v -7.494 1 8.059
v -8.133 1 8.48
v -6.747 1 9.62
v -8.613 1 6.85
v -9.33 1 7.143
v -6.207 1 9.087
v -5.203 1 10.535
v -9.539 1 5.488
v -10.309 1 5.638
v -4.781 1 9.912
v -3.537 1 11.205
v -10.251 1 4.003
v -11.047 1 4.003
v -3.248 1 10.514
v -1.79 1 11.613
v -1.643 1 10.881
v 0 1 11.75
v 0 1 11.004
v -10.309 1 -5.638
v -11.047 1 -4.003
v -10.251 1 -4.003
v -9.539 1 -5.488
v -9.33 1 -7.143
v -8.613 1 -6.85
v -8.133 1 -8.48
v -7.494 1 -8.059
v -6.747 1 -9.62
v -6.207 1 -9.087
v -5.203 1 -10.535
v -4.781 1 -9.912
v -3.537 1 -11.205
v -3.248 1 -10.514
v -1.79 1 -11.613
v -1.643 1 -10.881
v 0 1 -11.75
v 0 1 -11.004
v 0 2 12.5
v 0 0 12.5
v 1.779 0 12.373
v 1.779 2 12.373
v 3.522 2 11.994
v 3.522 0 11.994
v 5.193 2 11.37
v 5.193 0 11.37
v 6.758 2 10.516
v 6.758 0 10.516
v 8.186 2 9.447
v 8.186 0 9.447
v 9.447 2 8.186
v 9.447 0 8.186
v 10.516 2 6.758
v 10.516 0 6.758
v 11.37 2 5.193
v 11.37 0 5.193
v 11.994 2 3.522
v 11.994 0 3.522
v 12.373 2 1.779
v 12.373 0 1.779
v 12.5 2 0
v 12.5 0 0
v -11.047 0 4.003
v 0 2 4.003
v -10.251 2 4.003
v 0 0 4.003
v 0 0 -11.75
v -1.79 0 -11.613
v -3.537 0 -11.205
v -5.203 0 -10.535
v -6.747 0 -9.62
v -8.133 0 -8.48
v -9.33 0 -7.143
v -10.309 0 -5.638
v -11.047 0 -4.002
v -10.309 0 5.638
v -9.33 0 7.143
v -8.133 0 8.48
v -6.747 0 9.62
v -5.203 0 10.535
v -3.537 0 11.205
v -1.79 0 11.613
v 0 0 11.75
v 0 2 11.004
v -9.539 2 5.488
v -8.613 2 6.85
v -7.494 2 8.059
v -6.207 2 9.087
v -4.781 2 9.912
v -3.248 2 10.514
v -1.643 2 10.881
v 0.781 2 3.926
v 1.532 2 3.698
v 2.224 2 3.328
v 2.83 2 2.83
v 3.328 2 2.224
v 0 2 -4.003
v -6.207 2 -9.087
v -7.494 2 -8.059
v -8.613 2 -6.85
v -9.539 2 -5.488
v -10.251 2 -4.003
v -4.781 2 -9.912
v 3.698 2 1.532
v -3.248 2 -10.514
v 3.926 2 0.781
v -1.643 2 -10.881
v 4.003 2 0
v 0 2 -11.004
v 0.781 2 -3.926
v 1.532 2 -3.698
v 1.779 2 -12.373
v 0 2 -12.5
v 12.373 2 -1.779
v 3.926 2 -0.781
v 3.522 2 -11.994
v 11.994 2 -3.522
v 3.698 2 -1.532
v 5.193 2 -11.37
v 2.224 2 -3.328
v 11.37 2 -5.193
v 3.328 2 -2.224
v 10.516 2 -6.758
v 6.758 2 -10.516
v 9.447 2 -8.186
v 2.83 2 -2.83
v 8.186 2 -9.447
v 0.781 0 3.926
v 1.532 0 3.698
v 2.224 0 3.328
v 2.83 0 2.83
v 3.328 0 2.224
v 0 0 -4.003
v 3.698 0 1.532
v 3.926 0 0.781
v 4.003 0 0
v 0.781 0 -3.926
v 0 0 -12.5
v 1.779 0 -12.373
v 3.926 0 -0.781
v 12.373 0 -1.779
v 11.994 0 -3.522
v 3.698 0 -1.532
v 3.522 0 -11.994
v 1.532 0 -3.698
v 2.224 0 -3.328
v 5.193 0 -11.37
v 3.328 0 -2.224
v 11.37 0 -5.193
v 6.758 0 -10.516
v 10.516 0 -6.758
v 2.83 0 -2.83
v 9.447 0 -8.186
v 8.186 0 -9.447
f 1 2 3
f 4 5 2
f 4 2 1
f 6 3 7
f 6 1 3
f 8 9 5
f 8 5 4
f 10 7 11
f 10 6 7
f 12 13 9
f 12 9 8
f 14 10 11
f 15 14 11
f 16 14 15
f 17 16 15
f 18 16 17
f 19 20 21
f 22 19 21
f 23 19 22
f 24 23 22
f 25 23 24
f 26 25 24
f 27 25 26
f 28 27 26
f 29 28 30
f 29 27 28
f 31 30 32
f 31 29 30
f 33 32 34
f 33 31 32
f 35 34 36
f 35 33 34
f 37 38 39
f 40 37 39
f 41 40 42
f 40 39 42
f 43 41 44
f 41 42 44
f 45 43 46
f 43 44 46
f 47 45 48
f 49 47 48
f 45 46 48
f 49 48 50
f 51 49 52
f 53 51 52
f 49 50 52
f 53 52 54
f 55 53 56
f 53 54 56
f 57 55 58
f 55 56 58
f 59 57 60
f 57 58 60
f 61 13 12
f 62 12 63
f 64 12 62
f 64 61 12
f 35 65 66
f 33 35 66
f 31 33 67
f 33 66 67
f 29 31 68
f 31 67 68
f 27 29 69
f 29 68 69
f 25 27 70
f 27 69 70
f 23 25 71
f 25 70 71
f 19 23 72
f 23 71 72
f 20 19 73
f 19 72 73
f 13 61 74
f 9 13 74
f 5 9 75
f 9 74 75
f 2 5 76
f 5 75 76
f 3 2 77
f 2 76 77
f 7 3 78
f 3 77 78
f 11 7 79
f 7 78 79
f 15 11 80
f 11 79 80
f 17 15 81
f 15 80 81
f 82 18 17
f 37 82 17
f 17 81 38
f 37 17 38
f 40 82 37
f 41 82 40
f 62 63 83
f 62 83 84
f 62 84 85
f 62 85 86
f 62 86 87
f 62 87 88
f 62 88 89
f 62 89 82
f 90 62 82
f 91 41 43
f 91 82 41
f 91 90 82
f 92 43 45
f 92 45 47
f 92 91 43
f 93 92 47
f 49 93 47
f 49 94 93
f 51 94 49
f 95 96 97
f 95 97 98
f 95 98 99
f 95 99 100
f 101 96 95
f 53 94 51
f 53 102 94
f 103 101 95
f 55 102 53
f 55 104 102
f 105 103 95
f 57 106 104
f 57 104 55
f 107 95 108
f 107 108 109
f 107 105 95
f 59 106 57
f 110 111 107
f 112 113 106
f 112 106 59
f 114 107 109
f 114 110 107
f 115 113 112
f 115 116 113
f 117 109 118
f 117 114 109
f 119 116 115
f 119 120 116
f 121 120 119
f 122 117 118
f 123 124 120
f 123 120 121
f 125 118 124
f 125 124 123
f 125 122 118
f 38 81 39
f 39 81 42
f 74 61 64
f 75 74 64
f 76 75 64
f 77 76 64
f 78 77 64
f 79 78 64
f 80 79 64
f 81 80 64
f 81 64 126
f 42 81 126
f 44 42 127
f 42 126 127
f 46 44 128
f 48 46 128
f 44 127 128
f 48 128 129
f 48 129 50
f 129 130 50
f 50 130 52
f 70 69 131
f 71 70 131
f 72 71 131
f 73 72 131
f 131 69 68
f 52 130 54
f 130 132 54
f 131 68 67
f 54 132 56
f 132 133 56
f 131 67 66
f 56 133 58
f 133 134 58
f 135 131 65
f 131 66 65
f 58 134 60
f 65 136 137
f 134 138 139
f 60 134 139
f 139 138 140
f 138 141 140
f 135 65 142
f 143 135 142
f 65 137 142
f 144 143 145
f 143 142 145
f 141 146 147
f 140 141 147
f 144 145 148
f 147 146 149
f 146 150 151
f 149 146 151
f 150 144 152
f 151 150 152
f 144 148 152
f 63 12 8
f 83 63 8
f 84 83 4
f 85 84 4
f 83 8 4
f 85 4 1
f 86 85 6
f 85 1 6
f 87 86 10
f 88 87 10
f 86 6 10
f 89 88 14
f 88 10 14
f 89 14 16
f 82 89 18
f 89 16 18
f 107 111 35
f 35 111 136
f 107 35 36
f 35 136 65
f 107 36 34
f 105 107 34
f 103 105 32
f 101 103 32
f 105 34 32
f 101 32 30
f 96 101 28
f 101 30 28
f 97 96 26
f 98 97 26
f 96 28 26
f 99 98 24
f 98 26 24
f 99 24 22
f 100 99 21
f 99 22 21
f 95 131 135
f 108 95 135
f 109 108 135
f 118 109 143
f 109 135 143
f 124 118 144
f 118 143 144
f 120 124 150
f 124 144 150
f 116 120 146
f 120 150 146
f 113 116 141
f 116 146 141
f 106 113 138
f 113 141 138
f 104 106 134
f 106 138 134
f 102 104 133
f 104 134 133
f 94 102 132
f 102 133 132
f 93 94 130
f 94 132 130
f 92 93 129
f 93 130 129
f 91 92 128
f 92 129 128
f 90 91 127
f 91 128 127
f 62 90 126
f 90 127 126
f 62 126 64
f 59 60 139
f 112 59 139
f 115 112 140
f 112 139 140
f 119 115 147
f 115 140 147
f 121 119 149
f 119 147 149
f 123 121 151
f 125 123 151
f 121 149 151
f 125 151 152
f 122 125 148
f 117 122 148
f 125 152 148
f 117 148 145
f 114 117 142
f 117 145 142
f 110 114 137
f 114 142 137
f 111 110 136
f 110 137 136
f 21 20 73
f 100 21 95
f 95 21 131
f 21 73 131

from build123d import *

# Parameters (mm, degrees)
BOSS_EXTRUDE1_DEPTH = 2
BOSS_EXTRUDE2_START = 1
SKETCH1_5_R         = 11.75
BOSS_EXTRUDE2_DEPTH = 1
CUT_EXTRUDE4_DEPTH  = 11
BOSS_EXTRUDE3_DEPTH = 1
BOSS_EXTRUDE4_DEPTH = 1
CUT_EXTRUDE5_START  = 2
CUT_EXTRUDE5_DEPTH  = 1
BOSS_EXTRUDE5_DEPTH = 2


with BuildPart() as part:
    # Sketch1 → Boss-Extrude1 (new body)
    with BuildSketch(Plane(origin=(0, 0, 0), x_dir=(1, 0, 0), z_dir=(0, 1, 0))):
        with BuildLine():
            Line((0, 12.5), (0, 11.75))
            ThreePointArc((0, 11.75), (8.308504679, 8.308504679), (11.75, 0))
            ThreePointArc((11.75, 0), (8.308504679, -8.308504679), (0, -11.75))
            Line((0, -11.75), (0, -12.5))
            ThreePointArc((0, -12.5), (8.838834765, -8.838834765), (12.5, 0))
            ThreePointArc((12.5, 0), (8.838834765, 8.838834765), (0, 12.5))
        make_face()
        with BuildLine():
            Line((0, 11.75), (0, 11.0045))
            ThreePointArc((0, 11.0045), (7.781356574, 7.781356574), (11.0045, 0))
            ThreePointArc((11.0045, 0), (7.781356574, -7.781356574), (0, -11.0045))
            Line((0, -11.0045), (0, -11.75))
            ThreePointArc((0, -11.75), (8.308504679, -8.308504679), (11.75, 0))
            ThreePointArc((11.75, 0), (8.308504679, 8.308504679), (0, 11.75))
        make_face()
    extrude(amount=BOSS_EXTRUDE1_DEPTH)

    # Sketch1<5> → Boss-Extrude2 (add)
    with BuildSketch(Plane(origin=(0, 0, 0), x_dir=(1, 0, 0), z_dir=(0, 1, 0)).offset(BOSS_EXTRUDE2_START)):
        Circle(SKETCH1_5_R)
    extrude(amount=BOSS_EXTRUDE2_DEPTH)

    # Sketch1<8> → Cut-Extrude4 (cut)
    with BuildSketch(Plane(origin=(0, 0, 0), x_dir=(1, 0, 0), z_dir=(0, 1, 0))):
        with BuildLine():
            ThreePointArc((4.0025, 0), (2.830194892, 2.830194892), (0, 4.0025))
            Line((0, 4.0025), (0, -4.0025))
            ThreePointArc((0, -4.0025), (2.830194892, -2.830194892), (4.0025, 0))
        make_face()
        with BuildLine():
            Line((0, -4.0025), (0, 4.0025))
            ThreePointArc((0, 4.0025), (-4.0025, 0), (0, -4.0025))
        make_face()
        with BuildLine():
            ThreePointArc((0, -4.0025), (-4.0025, 0), (0, 4.0025))
            Line((0, 4.0025), (-10.250805529, 4.0025))
            ThreePointArc((-10.250805529, 4.0025), (-11.0045, 0), (-10.250805529, -4.0025))
            Line((-10.250805529, -4.0025), (0, -4.0025))
        make_face()
        with BuildLine():
            ThreePointArc((-10.250805529, -4.0025), (-11.0045, 0), (-10.250805529, 4.0025))
            Line((-10.250805529, 4.0025), (-11.047284451, 4.0025))
            ThreePointArc((-11.047284451, 4.0025), (-11.75, 0), (-11.047284451, -4.0025))
            Line((-11.047284451, -4.0025), (-10.250805529, -4.0025))
        make_face()
    extrude(amount=CUT_EXTRUDE4_DEPTH, mode=Mode.SUBTRACT)

    # Sketch1<9> → Boss-Extrude3 (add)
    with BuildSketch(Plane(origin=(0, 0, 0), x_dir=(1, 0, 0), z_dir=(0, 1, 0))):
        with BuildLine():
            Line((0, 11.0045), (0, 4.0025))
            ThreePointArc((0, 4.0025), (2.830194892, 2.830194892), (4.0025, 0))
            ThreePointArc((4.0025, 0), (2.830194892, -2.830194892), (0, -4.0025))
            Line((0, -4.0025), (0, -11.0045))
            ThreePointArc((0, -11.0045), (7.781356574, -7.781356574), (11.0045, 0))
            ThreePointArc((11.0045, 0), (7.781356574, 7.781356574), (0, 11.0045))
        make_face()
    extrude(amount=BOSS_EXTRUDE3_DEPTH)

    # Sketch1<10> → Boss-Extrude4 (add)
    with BuildSketch(Plane(origin=(0, 0, 0), x_dir=(1, 0, 0), z_dir=(0, 1, 0))):
        with BuildLine():
            Line((-10.250805529, 4.0025), (0, 4.0025))
            Line((0, 4.0025), (0, 11.0045))
            ThreePointArc((0, 11.0045), (-6.206992388, 9.08692829), (-10.250805529, 4.0025))
        make_face()
        with BuildLine():
            Line((0, -11.0045), (0, -4.0025))
            Line((0, -4.0025), (-10.250805529, -4.0025))
            ThreePointArc((-10.250805529, -4.0025), (-6.206992388, -9.08692829), (0, -11.0045))
        make_face()
        with BuildLine():
            Line((0, -11.75), (0, -11.0045))
            ThreePointArc((0, -11.0045), (-6.206992388, -9.08692829), (-10.250805529, -4.0025))
            Line((-10.250805529, -4.0025), (-11.047284451, -4.0025))
            ThreePointArc((-11.047284451, -4.0025), (-6.746596364, -9.620079911), (0, -11.75))
        make_face()
        with BuildLine():
            ThreePointArc((-10.250805529, 4.0025), (-6.206992388, 9.08692829), (0, 11.0045))
            Line((0, 11.0045), (0, 11.75))
            ThreePointArc((0, 11.75), (-6.746596364, 9.620079911), (-11.047284451, 4.0025))
            Line((-11.047284451, 4.0025), (-10.250805529, 4.0025))
        make_face()
    extrude(amount=BOSS_EXTRUDE4_DEPTH)

    # Sketch1<11> → Cut-Extrude5 (cut)
    with BuildSketch(Plane(origin=(0, 0, 0), x_dir=(1, 0, 0), z_dir=(0, 1, 0)).offset(CUT_EXTRUDE5_START)):
        with BuildLine():
            Line((-10.250805529, 4.0025), (0, 4.0025))
            Line((0, 4.0025), (0, 11.0045))
            ThreePointArc((0, 11.0045), (-6.206992388, 9.08692829), (-10.250805529, 4.0025))
        make_face()
        with BuildLine():
            ThreePointArc((-10.250805529, 4.0025), (-6.206992388, 9.08692829), (0, 11.0045))
            Line((0, 11.0045), (0, 11.75))
            ThreePointArc((0, 11.75), (-6.746596364, 9.620079911), (-11.047284451, 4.0025))
            Line((-11.047284451, 4.0025), (-10.250805529, 4.0025))
        make_face()
        with BuildLine():
            Line((0, -11.0045), (0, -4.0025))
            Line((0, -4.0025), (-10.250805529, -4.0025))
            ThreePointArc((-10.250805529, -4.0025), (-6.206992388, -9.08692829), (0, -11.0045))
        make_face()
        with BuildLine():
            Line((0, -11.75), (0, -11.0045))
            ThreePointArc((0, -11.0045), (-6.206992388, -9.08692829), (-10.250805529, -4.0025))
            Line((-10.250805529, -4.0025), (-11.047284451, -4.0025))
            ThreePointArc((-11.047284451, -4.0025), (-6.746596364, -9.620079911), (0, -11.75))
        make_face()
    extrude(amount=-CUT_EXTRUDE5_DEPTH, mode=Mode.SUBTRACT)

    # Sketch1<12> → Boss-Extrude5 (add)
    with BuildSketch(Plane(origin=(0, 0, 0), x_dir=(1, 0, 0), z_dir=(0, 1, 0))):
        with BuildLine():
            Line((0, -11.0045), (0, -4.0025))
            Line((0, -4.0025), (-10.250805529, -4.0025))
            ThreePointArc((-10.250805529, -4.0025), (-6.206992388, -9.08692829), (0, -11.0045))
        make_face()
        with BuildLine():
            Line((-10.250805529, 4.0025), (0, 4.0025))
            Line((0, 4.0025), (0, 11.0045))
            ThreePointArc((0, 11.0045), (-6.206992388, 9.08692829), (-10.250805529, 4.0025))
        make_face()
    extrude(amount=BOSS_EXTRUDE5_DEPTH)


solid = part.part
